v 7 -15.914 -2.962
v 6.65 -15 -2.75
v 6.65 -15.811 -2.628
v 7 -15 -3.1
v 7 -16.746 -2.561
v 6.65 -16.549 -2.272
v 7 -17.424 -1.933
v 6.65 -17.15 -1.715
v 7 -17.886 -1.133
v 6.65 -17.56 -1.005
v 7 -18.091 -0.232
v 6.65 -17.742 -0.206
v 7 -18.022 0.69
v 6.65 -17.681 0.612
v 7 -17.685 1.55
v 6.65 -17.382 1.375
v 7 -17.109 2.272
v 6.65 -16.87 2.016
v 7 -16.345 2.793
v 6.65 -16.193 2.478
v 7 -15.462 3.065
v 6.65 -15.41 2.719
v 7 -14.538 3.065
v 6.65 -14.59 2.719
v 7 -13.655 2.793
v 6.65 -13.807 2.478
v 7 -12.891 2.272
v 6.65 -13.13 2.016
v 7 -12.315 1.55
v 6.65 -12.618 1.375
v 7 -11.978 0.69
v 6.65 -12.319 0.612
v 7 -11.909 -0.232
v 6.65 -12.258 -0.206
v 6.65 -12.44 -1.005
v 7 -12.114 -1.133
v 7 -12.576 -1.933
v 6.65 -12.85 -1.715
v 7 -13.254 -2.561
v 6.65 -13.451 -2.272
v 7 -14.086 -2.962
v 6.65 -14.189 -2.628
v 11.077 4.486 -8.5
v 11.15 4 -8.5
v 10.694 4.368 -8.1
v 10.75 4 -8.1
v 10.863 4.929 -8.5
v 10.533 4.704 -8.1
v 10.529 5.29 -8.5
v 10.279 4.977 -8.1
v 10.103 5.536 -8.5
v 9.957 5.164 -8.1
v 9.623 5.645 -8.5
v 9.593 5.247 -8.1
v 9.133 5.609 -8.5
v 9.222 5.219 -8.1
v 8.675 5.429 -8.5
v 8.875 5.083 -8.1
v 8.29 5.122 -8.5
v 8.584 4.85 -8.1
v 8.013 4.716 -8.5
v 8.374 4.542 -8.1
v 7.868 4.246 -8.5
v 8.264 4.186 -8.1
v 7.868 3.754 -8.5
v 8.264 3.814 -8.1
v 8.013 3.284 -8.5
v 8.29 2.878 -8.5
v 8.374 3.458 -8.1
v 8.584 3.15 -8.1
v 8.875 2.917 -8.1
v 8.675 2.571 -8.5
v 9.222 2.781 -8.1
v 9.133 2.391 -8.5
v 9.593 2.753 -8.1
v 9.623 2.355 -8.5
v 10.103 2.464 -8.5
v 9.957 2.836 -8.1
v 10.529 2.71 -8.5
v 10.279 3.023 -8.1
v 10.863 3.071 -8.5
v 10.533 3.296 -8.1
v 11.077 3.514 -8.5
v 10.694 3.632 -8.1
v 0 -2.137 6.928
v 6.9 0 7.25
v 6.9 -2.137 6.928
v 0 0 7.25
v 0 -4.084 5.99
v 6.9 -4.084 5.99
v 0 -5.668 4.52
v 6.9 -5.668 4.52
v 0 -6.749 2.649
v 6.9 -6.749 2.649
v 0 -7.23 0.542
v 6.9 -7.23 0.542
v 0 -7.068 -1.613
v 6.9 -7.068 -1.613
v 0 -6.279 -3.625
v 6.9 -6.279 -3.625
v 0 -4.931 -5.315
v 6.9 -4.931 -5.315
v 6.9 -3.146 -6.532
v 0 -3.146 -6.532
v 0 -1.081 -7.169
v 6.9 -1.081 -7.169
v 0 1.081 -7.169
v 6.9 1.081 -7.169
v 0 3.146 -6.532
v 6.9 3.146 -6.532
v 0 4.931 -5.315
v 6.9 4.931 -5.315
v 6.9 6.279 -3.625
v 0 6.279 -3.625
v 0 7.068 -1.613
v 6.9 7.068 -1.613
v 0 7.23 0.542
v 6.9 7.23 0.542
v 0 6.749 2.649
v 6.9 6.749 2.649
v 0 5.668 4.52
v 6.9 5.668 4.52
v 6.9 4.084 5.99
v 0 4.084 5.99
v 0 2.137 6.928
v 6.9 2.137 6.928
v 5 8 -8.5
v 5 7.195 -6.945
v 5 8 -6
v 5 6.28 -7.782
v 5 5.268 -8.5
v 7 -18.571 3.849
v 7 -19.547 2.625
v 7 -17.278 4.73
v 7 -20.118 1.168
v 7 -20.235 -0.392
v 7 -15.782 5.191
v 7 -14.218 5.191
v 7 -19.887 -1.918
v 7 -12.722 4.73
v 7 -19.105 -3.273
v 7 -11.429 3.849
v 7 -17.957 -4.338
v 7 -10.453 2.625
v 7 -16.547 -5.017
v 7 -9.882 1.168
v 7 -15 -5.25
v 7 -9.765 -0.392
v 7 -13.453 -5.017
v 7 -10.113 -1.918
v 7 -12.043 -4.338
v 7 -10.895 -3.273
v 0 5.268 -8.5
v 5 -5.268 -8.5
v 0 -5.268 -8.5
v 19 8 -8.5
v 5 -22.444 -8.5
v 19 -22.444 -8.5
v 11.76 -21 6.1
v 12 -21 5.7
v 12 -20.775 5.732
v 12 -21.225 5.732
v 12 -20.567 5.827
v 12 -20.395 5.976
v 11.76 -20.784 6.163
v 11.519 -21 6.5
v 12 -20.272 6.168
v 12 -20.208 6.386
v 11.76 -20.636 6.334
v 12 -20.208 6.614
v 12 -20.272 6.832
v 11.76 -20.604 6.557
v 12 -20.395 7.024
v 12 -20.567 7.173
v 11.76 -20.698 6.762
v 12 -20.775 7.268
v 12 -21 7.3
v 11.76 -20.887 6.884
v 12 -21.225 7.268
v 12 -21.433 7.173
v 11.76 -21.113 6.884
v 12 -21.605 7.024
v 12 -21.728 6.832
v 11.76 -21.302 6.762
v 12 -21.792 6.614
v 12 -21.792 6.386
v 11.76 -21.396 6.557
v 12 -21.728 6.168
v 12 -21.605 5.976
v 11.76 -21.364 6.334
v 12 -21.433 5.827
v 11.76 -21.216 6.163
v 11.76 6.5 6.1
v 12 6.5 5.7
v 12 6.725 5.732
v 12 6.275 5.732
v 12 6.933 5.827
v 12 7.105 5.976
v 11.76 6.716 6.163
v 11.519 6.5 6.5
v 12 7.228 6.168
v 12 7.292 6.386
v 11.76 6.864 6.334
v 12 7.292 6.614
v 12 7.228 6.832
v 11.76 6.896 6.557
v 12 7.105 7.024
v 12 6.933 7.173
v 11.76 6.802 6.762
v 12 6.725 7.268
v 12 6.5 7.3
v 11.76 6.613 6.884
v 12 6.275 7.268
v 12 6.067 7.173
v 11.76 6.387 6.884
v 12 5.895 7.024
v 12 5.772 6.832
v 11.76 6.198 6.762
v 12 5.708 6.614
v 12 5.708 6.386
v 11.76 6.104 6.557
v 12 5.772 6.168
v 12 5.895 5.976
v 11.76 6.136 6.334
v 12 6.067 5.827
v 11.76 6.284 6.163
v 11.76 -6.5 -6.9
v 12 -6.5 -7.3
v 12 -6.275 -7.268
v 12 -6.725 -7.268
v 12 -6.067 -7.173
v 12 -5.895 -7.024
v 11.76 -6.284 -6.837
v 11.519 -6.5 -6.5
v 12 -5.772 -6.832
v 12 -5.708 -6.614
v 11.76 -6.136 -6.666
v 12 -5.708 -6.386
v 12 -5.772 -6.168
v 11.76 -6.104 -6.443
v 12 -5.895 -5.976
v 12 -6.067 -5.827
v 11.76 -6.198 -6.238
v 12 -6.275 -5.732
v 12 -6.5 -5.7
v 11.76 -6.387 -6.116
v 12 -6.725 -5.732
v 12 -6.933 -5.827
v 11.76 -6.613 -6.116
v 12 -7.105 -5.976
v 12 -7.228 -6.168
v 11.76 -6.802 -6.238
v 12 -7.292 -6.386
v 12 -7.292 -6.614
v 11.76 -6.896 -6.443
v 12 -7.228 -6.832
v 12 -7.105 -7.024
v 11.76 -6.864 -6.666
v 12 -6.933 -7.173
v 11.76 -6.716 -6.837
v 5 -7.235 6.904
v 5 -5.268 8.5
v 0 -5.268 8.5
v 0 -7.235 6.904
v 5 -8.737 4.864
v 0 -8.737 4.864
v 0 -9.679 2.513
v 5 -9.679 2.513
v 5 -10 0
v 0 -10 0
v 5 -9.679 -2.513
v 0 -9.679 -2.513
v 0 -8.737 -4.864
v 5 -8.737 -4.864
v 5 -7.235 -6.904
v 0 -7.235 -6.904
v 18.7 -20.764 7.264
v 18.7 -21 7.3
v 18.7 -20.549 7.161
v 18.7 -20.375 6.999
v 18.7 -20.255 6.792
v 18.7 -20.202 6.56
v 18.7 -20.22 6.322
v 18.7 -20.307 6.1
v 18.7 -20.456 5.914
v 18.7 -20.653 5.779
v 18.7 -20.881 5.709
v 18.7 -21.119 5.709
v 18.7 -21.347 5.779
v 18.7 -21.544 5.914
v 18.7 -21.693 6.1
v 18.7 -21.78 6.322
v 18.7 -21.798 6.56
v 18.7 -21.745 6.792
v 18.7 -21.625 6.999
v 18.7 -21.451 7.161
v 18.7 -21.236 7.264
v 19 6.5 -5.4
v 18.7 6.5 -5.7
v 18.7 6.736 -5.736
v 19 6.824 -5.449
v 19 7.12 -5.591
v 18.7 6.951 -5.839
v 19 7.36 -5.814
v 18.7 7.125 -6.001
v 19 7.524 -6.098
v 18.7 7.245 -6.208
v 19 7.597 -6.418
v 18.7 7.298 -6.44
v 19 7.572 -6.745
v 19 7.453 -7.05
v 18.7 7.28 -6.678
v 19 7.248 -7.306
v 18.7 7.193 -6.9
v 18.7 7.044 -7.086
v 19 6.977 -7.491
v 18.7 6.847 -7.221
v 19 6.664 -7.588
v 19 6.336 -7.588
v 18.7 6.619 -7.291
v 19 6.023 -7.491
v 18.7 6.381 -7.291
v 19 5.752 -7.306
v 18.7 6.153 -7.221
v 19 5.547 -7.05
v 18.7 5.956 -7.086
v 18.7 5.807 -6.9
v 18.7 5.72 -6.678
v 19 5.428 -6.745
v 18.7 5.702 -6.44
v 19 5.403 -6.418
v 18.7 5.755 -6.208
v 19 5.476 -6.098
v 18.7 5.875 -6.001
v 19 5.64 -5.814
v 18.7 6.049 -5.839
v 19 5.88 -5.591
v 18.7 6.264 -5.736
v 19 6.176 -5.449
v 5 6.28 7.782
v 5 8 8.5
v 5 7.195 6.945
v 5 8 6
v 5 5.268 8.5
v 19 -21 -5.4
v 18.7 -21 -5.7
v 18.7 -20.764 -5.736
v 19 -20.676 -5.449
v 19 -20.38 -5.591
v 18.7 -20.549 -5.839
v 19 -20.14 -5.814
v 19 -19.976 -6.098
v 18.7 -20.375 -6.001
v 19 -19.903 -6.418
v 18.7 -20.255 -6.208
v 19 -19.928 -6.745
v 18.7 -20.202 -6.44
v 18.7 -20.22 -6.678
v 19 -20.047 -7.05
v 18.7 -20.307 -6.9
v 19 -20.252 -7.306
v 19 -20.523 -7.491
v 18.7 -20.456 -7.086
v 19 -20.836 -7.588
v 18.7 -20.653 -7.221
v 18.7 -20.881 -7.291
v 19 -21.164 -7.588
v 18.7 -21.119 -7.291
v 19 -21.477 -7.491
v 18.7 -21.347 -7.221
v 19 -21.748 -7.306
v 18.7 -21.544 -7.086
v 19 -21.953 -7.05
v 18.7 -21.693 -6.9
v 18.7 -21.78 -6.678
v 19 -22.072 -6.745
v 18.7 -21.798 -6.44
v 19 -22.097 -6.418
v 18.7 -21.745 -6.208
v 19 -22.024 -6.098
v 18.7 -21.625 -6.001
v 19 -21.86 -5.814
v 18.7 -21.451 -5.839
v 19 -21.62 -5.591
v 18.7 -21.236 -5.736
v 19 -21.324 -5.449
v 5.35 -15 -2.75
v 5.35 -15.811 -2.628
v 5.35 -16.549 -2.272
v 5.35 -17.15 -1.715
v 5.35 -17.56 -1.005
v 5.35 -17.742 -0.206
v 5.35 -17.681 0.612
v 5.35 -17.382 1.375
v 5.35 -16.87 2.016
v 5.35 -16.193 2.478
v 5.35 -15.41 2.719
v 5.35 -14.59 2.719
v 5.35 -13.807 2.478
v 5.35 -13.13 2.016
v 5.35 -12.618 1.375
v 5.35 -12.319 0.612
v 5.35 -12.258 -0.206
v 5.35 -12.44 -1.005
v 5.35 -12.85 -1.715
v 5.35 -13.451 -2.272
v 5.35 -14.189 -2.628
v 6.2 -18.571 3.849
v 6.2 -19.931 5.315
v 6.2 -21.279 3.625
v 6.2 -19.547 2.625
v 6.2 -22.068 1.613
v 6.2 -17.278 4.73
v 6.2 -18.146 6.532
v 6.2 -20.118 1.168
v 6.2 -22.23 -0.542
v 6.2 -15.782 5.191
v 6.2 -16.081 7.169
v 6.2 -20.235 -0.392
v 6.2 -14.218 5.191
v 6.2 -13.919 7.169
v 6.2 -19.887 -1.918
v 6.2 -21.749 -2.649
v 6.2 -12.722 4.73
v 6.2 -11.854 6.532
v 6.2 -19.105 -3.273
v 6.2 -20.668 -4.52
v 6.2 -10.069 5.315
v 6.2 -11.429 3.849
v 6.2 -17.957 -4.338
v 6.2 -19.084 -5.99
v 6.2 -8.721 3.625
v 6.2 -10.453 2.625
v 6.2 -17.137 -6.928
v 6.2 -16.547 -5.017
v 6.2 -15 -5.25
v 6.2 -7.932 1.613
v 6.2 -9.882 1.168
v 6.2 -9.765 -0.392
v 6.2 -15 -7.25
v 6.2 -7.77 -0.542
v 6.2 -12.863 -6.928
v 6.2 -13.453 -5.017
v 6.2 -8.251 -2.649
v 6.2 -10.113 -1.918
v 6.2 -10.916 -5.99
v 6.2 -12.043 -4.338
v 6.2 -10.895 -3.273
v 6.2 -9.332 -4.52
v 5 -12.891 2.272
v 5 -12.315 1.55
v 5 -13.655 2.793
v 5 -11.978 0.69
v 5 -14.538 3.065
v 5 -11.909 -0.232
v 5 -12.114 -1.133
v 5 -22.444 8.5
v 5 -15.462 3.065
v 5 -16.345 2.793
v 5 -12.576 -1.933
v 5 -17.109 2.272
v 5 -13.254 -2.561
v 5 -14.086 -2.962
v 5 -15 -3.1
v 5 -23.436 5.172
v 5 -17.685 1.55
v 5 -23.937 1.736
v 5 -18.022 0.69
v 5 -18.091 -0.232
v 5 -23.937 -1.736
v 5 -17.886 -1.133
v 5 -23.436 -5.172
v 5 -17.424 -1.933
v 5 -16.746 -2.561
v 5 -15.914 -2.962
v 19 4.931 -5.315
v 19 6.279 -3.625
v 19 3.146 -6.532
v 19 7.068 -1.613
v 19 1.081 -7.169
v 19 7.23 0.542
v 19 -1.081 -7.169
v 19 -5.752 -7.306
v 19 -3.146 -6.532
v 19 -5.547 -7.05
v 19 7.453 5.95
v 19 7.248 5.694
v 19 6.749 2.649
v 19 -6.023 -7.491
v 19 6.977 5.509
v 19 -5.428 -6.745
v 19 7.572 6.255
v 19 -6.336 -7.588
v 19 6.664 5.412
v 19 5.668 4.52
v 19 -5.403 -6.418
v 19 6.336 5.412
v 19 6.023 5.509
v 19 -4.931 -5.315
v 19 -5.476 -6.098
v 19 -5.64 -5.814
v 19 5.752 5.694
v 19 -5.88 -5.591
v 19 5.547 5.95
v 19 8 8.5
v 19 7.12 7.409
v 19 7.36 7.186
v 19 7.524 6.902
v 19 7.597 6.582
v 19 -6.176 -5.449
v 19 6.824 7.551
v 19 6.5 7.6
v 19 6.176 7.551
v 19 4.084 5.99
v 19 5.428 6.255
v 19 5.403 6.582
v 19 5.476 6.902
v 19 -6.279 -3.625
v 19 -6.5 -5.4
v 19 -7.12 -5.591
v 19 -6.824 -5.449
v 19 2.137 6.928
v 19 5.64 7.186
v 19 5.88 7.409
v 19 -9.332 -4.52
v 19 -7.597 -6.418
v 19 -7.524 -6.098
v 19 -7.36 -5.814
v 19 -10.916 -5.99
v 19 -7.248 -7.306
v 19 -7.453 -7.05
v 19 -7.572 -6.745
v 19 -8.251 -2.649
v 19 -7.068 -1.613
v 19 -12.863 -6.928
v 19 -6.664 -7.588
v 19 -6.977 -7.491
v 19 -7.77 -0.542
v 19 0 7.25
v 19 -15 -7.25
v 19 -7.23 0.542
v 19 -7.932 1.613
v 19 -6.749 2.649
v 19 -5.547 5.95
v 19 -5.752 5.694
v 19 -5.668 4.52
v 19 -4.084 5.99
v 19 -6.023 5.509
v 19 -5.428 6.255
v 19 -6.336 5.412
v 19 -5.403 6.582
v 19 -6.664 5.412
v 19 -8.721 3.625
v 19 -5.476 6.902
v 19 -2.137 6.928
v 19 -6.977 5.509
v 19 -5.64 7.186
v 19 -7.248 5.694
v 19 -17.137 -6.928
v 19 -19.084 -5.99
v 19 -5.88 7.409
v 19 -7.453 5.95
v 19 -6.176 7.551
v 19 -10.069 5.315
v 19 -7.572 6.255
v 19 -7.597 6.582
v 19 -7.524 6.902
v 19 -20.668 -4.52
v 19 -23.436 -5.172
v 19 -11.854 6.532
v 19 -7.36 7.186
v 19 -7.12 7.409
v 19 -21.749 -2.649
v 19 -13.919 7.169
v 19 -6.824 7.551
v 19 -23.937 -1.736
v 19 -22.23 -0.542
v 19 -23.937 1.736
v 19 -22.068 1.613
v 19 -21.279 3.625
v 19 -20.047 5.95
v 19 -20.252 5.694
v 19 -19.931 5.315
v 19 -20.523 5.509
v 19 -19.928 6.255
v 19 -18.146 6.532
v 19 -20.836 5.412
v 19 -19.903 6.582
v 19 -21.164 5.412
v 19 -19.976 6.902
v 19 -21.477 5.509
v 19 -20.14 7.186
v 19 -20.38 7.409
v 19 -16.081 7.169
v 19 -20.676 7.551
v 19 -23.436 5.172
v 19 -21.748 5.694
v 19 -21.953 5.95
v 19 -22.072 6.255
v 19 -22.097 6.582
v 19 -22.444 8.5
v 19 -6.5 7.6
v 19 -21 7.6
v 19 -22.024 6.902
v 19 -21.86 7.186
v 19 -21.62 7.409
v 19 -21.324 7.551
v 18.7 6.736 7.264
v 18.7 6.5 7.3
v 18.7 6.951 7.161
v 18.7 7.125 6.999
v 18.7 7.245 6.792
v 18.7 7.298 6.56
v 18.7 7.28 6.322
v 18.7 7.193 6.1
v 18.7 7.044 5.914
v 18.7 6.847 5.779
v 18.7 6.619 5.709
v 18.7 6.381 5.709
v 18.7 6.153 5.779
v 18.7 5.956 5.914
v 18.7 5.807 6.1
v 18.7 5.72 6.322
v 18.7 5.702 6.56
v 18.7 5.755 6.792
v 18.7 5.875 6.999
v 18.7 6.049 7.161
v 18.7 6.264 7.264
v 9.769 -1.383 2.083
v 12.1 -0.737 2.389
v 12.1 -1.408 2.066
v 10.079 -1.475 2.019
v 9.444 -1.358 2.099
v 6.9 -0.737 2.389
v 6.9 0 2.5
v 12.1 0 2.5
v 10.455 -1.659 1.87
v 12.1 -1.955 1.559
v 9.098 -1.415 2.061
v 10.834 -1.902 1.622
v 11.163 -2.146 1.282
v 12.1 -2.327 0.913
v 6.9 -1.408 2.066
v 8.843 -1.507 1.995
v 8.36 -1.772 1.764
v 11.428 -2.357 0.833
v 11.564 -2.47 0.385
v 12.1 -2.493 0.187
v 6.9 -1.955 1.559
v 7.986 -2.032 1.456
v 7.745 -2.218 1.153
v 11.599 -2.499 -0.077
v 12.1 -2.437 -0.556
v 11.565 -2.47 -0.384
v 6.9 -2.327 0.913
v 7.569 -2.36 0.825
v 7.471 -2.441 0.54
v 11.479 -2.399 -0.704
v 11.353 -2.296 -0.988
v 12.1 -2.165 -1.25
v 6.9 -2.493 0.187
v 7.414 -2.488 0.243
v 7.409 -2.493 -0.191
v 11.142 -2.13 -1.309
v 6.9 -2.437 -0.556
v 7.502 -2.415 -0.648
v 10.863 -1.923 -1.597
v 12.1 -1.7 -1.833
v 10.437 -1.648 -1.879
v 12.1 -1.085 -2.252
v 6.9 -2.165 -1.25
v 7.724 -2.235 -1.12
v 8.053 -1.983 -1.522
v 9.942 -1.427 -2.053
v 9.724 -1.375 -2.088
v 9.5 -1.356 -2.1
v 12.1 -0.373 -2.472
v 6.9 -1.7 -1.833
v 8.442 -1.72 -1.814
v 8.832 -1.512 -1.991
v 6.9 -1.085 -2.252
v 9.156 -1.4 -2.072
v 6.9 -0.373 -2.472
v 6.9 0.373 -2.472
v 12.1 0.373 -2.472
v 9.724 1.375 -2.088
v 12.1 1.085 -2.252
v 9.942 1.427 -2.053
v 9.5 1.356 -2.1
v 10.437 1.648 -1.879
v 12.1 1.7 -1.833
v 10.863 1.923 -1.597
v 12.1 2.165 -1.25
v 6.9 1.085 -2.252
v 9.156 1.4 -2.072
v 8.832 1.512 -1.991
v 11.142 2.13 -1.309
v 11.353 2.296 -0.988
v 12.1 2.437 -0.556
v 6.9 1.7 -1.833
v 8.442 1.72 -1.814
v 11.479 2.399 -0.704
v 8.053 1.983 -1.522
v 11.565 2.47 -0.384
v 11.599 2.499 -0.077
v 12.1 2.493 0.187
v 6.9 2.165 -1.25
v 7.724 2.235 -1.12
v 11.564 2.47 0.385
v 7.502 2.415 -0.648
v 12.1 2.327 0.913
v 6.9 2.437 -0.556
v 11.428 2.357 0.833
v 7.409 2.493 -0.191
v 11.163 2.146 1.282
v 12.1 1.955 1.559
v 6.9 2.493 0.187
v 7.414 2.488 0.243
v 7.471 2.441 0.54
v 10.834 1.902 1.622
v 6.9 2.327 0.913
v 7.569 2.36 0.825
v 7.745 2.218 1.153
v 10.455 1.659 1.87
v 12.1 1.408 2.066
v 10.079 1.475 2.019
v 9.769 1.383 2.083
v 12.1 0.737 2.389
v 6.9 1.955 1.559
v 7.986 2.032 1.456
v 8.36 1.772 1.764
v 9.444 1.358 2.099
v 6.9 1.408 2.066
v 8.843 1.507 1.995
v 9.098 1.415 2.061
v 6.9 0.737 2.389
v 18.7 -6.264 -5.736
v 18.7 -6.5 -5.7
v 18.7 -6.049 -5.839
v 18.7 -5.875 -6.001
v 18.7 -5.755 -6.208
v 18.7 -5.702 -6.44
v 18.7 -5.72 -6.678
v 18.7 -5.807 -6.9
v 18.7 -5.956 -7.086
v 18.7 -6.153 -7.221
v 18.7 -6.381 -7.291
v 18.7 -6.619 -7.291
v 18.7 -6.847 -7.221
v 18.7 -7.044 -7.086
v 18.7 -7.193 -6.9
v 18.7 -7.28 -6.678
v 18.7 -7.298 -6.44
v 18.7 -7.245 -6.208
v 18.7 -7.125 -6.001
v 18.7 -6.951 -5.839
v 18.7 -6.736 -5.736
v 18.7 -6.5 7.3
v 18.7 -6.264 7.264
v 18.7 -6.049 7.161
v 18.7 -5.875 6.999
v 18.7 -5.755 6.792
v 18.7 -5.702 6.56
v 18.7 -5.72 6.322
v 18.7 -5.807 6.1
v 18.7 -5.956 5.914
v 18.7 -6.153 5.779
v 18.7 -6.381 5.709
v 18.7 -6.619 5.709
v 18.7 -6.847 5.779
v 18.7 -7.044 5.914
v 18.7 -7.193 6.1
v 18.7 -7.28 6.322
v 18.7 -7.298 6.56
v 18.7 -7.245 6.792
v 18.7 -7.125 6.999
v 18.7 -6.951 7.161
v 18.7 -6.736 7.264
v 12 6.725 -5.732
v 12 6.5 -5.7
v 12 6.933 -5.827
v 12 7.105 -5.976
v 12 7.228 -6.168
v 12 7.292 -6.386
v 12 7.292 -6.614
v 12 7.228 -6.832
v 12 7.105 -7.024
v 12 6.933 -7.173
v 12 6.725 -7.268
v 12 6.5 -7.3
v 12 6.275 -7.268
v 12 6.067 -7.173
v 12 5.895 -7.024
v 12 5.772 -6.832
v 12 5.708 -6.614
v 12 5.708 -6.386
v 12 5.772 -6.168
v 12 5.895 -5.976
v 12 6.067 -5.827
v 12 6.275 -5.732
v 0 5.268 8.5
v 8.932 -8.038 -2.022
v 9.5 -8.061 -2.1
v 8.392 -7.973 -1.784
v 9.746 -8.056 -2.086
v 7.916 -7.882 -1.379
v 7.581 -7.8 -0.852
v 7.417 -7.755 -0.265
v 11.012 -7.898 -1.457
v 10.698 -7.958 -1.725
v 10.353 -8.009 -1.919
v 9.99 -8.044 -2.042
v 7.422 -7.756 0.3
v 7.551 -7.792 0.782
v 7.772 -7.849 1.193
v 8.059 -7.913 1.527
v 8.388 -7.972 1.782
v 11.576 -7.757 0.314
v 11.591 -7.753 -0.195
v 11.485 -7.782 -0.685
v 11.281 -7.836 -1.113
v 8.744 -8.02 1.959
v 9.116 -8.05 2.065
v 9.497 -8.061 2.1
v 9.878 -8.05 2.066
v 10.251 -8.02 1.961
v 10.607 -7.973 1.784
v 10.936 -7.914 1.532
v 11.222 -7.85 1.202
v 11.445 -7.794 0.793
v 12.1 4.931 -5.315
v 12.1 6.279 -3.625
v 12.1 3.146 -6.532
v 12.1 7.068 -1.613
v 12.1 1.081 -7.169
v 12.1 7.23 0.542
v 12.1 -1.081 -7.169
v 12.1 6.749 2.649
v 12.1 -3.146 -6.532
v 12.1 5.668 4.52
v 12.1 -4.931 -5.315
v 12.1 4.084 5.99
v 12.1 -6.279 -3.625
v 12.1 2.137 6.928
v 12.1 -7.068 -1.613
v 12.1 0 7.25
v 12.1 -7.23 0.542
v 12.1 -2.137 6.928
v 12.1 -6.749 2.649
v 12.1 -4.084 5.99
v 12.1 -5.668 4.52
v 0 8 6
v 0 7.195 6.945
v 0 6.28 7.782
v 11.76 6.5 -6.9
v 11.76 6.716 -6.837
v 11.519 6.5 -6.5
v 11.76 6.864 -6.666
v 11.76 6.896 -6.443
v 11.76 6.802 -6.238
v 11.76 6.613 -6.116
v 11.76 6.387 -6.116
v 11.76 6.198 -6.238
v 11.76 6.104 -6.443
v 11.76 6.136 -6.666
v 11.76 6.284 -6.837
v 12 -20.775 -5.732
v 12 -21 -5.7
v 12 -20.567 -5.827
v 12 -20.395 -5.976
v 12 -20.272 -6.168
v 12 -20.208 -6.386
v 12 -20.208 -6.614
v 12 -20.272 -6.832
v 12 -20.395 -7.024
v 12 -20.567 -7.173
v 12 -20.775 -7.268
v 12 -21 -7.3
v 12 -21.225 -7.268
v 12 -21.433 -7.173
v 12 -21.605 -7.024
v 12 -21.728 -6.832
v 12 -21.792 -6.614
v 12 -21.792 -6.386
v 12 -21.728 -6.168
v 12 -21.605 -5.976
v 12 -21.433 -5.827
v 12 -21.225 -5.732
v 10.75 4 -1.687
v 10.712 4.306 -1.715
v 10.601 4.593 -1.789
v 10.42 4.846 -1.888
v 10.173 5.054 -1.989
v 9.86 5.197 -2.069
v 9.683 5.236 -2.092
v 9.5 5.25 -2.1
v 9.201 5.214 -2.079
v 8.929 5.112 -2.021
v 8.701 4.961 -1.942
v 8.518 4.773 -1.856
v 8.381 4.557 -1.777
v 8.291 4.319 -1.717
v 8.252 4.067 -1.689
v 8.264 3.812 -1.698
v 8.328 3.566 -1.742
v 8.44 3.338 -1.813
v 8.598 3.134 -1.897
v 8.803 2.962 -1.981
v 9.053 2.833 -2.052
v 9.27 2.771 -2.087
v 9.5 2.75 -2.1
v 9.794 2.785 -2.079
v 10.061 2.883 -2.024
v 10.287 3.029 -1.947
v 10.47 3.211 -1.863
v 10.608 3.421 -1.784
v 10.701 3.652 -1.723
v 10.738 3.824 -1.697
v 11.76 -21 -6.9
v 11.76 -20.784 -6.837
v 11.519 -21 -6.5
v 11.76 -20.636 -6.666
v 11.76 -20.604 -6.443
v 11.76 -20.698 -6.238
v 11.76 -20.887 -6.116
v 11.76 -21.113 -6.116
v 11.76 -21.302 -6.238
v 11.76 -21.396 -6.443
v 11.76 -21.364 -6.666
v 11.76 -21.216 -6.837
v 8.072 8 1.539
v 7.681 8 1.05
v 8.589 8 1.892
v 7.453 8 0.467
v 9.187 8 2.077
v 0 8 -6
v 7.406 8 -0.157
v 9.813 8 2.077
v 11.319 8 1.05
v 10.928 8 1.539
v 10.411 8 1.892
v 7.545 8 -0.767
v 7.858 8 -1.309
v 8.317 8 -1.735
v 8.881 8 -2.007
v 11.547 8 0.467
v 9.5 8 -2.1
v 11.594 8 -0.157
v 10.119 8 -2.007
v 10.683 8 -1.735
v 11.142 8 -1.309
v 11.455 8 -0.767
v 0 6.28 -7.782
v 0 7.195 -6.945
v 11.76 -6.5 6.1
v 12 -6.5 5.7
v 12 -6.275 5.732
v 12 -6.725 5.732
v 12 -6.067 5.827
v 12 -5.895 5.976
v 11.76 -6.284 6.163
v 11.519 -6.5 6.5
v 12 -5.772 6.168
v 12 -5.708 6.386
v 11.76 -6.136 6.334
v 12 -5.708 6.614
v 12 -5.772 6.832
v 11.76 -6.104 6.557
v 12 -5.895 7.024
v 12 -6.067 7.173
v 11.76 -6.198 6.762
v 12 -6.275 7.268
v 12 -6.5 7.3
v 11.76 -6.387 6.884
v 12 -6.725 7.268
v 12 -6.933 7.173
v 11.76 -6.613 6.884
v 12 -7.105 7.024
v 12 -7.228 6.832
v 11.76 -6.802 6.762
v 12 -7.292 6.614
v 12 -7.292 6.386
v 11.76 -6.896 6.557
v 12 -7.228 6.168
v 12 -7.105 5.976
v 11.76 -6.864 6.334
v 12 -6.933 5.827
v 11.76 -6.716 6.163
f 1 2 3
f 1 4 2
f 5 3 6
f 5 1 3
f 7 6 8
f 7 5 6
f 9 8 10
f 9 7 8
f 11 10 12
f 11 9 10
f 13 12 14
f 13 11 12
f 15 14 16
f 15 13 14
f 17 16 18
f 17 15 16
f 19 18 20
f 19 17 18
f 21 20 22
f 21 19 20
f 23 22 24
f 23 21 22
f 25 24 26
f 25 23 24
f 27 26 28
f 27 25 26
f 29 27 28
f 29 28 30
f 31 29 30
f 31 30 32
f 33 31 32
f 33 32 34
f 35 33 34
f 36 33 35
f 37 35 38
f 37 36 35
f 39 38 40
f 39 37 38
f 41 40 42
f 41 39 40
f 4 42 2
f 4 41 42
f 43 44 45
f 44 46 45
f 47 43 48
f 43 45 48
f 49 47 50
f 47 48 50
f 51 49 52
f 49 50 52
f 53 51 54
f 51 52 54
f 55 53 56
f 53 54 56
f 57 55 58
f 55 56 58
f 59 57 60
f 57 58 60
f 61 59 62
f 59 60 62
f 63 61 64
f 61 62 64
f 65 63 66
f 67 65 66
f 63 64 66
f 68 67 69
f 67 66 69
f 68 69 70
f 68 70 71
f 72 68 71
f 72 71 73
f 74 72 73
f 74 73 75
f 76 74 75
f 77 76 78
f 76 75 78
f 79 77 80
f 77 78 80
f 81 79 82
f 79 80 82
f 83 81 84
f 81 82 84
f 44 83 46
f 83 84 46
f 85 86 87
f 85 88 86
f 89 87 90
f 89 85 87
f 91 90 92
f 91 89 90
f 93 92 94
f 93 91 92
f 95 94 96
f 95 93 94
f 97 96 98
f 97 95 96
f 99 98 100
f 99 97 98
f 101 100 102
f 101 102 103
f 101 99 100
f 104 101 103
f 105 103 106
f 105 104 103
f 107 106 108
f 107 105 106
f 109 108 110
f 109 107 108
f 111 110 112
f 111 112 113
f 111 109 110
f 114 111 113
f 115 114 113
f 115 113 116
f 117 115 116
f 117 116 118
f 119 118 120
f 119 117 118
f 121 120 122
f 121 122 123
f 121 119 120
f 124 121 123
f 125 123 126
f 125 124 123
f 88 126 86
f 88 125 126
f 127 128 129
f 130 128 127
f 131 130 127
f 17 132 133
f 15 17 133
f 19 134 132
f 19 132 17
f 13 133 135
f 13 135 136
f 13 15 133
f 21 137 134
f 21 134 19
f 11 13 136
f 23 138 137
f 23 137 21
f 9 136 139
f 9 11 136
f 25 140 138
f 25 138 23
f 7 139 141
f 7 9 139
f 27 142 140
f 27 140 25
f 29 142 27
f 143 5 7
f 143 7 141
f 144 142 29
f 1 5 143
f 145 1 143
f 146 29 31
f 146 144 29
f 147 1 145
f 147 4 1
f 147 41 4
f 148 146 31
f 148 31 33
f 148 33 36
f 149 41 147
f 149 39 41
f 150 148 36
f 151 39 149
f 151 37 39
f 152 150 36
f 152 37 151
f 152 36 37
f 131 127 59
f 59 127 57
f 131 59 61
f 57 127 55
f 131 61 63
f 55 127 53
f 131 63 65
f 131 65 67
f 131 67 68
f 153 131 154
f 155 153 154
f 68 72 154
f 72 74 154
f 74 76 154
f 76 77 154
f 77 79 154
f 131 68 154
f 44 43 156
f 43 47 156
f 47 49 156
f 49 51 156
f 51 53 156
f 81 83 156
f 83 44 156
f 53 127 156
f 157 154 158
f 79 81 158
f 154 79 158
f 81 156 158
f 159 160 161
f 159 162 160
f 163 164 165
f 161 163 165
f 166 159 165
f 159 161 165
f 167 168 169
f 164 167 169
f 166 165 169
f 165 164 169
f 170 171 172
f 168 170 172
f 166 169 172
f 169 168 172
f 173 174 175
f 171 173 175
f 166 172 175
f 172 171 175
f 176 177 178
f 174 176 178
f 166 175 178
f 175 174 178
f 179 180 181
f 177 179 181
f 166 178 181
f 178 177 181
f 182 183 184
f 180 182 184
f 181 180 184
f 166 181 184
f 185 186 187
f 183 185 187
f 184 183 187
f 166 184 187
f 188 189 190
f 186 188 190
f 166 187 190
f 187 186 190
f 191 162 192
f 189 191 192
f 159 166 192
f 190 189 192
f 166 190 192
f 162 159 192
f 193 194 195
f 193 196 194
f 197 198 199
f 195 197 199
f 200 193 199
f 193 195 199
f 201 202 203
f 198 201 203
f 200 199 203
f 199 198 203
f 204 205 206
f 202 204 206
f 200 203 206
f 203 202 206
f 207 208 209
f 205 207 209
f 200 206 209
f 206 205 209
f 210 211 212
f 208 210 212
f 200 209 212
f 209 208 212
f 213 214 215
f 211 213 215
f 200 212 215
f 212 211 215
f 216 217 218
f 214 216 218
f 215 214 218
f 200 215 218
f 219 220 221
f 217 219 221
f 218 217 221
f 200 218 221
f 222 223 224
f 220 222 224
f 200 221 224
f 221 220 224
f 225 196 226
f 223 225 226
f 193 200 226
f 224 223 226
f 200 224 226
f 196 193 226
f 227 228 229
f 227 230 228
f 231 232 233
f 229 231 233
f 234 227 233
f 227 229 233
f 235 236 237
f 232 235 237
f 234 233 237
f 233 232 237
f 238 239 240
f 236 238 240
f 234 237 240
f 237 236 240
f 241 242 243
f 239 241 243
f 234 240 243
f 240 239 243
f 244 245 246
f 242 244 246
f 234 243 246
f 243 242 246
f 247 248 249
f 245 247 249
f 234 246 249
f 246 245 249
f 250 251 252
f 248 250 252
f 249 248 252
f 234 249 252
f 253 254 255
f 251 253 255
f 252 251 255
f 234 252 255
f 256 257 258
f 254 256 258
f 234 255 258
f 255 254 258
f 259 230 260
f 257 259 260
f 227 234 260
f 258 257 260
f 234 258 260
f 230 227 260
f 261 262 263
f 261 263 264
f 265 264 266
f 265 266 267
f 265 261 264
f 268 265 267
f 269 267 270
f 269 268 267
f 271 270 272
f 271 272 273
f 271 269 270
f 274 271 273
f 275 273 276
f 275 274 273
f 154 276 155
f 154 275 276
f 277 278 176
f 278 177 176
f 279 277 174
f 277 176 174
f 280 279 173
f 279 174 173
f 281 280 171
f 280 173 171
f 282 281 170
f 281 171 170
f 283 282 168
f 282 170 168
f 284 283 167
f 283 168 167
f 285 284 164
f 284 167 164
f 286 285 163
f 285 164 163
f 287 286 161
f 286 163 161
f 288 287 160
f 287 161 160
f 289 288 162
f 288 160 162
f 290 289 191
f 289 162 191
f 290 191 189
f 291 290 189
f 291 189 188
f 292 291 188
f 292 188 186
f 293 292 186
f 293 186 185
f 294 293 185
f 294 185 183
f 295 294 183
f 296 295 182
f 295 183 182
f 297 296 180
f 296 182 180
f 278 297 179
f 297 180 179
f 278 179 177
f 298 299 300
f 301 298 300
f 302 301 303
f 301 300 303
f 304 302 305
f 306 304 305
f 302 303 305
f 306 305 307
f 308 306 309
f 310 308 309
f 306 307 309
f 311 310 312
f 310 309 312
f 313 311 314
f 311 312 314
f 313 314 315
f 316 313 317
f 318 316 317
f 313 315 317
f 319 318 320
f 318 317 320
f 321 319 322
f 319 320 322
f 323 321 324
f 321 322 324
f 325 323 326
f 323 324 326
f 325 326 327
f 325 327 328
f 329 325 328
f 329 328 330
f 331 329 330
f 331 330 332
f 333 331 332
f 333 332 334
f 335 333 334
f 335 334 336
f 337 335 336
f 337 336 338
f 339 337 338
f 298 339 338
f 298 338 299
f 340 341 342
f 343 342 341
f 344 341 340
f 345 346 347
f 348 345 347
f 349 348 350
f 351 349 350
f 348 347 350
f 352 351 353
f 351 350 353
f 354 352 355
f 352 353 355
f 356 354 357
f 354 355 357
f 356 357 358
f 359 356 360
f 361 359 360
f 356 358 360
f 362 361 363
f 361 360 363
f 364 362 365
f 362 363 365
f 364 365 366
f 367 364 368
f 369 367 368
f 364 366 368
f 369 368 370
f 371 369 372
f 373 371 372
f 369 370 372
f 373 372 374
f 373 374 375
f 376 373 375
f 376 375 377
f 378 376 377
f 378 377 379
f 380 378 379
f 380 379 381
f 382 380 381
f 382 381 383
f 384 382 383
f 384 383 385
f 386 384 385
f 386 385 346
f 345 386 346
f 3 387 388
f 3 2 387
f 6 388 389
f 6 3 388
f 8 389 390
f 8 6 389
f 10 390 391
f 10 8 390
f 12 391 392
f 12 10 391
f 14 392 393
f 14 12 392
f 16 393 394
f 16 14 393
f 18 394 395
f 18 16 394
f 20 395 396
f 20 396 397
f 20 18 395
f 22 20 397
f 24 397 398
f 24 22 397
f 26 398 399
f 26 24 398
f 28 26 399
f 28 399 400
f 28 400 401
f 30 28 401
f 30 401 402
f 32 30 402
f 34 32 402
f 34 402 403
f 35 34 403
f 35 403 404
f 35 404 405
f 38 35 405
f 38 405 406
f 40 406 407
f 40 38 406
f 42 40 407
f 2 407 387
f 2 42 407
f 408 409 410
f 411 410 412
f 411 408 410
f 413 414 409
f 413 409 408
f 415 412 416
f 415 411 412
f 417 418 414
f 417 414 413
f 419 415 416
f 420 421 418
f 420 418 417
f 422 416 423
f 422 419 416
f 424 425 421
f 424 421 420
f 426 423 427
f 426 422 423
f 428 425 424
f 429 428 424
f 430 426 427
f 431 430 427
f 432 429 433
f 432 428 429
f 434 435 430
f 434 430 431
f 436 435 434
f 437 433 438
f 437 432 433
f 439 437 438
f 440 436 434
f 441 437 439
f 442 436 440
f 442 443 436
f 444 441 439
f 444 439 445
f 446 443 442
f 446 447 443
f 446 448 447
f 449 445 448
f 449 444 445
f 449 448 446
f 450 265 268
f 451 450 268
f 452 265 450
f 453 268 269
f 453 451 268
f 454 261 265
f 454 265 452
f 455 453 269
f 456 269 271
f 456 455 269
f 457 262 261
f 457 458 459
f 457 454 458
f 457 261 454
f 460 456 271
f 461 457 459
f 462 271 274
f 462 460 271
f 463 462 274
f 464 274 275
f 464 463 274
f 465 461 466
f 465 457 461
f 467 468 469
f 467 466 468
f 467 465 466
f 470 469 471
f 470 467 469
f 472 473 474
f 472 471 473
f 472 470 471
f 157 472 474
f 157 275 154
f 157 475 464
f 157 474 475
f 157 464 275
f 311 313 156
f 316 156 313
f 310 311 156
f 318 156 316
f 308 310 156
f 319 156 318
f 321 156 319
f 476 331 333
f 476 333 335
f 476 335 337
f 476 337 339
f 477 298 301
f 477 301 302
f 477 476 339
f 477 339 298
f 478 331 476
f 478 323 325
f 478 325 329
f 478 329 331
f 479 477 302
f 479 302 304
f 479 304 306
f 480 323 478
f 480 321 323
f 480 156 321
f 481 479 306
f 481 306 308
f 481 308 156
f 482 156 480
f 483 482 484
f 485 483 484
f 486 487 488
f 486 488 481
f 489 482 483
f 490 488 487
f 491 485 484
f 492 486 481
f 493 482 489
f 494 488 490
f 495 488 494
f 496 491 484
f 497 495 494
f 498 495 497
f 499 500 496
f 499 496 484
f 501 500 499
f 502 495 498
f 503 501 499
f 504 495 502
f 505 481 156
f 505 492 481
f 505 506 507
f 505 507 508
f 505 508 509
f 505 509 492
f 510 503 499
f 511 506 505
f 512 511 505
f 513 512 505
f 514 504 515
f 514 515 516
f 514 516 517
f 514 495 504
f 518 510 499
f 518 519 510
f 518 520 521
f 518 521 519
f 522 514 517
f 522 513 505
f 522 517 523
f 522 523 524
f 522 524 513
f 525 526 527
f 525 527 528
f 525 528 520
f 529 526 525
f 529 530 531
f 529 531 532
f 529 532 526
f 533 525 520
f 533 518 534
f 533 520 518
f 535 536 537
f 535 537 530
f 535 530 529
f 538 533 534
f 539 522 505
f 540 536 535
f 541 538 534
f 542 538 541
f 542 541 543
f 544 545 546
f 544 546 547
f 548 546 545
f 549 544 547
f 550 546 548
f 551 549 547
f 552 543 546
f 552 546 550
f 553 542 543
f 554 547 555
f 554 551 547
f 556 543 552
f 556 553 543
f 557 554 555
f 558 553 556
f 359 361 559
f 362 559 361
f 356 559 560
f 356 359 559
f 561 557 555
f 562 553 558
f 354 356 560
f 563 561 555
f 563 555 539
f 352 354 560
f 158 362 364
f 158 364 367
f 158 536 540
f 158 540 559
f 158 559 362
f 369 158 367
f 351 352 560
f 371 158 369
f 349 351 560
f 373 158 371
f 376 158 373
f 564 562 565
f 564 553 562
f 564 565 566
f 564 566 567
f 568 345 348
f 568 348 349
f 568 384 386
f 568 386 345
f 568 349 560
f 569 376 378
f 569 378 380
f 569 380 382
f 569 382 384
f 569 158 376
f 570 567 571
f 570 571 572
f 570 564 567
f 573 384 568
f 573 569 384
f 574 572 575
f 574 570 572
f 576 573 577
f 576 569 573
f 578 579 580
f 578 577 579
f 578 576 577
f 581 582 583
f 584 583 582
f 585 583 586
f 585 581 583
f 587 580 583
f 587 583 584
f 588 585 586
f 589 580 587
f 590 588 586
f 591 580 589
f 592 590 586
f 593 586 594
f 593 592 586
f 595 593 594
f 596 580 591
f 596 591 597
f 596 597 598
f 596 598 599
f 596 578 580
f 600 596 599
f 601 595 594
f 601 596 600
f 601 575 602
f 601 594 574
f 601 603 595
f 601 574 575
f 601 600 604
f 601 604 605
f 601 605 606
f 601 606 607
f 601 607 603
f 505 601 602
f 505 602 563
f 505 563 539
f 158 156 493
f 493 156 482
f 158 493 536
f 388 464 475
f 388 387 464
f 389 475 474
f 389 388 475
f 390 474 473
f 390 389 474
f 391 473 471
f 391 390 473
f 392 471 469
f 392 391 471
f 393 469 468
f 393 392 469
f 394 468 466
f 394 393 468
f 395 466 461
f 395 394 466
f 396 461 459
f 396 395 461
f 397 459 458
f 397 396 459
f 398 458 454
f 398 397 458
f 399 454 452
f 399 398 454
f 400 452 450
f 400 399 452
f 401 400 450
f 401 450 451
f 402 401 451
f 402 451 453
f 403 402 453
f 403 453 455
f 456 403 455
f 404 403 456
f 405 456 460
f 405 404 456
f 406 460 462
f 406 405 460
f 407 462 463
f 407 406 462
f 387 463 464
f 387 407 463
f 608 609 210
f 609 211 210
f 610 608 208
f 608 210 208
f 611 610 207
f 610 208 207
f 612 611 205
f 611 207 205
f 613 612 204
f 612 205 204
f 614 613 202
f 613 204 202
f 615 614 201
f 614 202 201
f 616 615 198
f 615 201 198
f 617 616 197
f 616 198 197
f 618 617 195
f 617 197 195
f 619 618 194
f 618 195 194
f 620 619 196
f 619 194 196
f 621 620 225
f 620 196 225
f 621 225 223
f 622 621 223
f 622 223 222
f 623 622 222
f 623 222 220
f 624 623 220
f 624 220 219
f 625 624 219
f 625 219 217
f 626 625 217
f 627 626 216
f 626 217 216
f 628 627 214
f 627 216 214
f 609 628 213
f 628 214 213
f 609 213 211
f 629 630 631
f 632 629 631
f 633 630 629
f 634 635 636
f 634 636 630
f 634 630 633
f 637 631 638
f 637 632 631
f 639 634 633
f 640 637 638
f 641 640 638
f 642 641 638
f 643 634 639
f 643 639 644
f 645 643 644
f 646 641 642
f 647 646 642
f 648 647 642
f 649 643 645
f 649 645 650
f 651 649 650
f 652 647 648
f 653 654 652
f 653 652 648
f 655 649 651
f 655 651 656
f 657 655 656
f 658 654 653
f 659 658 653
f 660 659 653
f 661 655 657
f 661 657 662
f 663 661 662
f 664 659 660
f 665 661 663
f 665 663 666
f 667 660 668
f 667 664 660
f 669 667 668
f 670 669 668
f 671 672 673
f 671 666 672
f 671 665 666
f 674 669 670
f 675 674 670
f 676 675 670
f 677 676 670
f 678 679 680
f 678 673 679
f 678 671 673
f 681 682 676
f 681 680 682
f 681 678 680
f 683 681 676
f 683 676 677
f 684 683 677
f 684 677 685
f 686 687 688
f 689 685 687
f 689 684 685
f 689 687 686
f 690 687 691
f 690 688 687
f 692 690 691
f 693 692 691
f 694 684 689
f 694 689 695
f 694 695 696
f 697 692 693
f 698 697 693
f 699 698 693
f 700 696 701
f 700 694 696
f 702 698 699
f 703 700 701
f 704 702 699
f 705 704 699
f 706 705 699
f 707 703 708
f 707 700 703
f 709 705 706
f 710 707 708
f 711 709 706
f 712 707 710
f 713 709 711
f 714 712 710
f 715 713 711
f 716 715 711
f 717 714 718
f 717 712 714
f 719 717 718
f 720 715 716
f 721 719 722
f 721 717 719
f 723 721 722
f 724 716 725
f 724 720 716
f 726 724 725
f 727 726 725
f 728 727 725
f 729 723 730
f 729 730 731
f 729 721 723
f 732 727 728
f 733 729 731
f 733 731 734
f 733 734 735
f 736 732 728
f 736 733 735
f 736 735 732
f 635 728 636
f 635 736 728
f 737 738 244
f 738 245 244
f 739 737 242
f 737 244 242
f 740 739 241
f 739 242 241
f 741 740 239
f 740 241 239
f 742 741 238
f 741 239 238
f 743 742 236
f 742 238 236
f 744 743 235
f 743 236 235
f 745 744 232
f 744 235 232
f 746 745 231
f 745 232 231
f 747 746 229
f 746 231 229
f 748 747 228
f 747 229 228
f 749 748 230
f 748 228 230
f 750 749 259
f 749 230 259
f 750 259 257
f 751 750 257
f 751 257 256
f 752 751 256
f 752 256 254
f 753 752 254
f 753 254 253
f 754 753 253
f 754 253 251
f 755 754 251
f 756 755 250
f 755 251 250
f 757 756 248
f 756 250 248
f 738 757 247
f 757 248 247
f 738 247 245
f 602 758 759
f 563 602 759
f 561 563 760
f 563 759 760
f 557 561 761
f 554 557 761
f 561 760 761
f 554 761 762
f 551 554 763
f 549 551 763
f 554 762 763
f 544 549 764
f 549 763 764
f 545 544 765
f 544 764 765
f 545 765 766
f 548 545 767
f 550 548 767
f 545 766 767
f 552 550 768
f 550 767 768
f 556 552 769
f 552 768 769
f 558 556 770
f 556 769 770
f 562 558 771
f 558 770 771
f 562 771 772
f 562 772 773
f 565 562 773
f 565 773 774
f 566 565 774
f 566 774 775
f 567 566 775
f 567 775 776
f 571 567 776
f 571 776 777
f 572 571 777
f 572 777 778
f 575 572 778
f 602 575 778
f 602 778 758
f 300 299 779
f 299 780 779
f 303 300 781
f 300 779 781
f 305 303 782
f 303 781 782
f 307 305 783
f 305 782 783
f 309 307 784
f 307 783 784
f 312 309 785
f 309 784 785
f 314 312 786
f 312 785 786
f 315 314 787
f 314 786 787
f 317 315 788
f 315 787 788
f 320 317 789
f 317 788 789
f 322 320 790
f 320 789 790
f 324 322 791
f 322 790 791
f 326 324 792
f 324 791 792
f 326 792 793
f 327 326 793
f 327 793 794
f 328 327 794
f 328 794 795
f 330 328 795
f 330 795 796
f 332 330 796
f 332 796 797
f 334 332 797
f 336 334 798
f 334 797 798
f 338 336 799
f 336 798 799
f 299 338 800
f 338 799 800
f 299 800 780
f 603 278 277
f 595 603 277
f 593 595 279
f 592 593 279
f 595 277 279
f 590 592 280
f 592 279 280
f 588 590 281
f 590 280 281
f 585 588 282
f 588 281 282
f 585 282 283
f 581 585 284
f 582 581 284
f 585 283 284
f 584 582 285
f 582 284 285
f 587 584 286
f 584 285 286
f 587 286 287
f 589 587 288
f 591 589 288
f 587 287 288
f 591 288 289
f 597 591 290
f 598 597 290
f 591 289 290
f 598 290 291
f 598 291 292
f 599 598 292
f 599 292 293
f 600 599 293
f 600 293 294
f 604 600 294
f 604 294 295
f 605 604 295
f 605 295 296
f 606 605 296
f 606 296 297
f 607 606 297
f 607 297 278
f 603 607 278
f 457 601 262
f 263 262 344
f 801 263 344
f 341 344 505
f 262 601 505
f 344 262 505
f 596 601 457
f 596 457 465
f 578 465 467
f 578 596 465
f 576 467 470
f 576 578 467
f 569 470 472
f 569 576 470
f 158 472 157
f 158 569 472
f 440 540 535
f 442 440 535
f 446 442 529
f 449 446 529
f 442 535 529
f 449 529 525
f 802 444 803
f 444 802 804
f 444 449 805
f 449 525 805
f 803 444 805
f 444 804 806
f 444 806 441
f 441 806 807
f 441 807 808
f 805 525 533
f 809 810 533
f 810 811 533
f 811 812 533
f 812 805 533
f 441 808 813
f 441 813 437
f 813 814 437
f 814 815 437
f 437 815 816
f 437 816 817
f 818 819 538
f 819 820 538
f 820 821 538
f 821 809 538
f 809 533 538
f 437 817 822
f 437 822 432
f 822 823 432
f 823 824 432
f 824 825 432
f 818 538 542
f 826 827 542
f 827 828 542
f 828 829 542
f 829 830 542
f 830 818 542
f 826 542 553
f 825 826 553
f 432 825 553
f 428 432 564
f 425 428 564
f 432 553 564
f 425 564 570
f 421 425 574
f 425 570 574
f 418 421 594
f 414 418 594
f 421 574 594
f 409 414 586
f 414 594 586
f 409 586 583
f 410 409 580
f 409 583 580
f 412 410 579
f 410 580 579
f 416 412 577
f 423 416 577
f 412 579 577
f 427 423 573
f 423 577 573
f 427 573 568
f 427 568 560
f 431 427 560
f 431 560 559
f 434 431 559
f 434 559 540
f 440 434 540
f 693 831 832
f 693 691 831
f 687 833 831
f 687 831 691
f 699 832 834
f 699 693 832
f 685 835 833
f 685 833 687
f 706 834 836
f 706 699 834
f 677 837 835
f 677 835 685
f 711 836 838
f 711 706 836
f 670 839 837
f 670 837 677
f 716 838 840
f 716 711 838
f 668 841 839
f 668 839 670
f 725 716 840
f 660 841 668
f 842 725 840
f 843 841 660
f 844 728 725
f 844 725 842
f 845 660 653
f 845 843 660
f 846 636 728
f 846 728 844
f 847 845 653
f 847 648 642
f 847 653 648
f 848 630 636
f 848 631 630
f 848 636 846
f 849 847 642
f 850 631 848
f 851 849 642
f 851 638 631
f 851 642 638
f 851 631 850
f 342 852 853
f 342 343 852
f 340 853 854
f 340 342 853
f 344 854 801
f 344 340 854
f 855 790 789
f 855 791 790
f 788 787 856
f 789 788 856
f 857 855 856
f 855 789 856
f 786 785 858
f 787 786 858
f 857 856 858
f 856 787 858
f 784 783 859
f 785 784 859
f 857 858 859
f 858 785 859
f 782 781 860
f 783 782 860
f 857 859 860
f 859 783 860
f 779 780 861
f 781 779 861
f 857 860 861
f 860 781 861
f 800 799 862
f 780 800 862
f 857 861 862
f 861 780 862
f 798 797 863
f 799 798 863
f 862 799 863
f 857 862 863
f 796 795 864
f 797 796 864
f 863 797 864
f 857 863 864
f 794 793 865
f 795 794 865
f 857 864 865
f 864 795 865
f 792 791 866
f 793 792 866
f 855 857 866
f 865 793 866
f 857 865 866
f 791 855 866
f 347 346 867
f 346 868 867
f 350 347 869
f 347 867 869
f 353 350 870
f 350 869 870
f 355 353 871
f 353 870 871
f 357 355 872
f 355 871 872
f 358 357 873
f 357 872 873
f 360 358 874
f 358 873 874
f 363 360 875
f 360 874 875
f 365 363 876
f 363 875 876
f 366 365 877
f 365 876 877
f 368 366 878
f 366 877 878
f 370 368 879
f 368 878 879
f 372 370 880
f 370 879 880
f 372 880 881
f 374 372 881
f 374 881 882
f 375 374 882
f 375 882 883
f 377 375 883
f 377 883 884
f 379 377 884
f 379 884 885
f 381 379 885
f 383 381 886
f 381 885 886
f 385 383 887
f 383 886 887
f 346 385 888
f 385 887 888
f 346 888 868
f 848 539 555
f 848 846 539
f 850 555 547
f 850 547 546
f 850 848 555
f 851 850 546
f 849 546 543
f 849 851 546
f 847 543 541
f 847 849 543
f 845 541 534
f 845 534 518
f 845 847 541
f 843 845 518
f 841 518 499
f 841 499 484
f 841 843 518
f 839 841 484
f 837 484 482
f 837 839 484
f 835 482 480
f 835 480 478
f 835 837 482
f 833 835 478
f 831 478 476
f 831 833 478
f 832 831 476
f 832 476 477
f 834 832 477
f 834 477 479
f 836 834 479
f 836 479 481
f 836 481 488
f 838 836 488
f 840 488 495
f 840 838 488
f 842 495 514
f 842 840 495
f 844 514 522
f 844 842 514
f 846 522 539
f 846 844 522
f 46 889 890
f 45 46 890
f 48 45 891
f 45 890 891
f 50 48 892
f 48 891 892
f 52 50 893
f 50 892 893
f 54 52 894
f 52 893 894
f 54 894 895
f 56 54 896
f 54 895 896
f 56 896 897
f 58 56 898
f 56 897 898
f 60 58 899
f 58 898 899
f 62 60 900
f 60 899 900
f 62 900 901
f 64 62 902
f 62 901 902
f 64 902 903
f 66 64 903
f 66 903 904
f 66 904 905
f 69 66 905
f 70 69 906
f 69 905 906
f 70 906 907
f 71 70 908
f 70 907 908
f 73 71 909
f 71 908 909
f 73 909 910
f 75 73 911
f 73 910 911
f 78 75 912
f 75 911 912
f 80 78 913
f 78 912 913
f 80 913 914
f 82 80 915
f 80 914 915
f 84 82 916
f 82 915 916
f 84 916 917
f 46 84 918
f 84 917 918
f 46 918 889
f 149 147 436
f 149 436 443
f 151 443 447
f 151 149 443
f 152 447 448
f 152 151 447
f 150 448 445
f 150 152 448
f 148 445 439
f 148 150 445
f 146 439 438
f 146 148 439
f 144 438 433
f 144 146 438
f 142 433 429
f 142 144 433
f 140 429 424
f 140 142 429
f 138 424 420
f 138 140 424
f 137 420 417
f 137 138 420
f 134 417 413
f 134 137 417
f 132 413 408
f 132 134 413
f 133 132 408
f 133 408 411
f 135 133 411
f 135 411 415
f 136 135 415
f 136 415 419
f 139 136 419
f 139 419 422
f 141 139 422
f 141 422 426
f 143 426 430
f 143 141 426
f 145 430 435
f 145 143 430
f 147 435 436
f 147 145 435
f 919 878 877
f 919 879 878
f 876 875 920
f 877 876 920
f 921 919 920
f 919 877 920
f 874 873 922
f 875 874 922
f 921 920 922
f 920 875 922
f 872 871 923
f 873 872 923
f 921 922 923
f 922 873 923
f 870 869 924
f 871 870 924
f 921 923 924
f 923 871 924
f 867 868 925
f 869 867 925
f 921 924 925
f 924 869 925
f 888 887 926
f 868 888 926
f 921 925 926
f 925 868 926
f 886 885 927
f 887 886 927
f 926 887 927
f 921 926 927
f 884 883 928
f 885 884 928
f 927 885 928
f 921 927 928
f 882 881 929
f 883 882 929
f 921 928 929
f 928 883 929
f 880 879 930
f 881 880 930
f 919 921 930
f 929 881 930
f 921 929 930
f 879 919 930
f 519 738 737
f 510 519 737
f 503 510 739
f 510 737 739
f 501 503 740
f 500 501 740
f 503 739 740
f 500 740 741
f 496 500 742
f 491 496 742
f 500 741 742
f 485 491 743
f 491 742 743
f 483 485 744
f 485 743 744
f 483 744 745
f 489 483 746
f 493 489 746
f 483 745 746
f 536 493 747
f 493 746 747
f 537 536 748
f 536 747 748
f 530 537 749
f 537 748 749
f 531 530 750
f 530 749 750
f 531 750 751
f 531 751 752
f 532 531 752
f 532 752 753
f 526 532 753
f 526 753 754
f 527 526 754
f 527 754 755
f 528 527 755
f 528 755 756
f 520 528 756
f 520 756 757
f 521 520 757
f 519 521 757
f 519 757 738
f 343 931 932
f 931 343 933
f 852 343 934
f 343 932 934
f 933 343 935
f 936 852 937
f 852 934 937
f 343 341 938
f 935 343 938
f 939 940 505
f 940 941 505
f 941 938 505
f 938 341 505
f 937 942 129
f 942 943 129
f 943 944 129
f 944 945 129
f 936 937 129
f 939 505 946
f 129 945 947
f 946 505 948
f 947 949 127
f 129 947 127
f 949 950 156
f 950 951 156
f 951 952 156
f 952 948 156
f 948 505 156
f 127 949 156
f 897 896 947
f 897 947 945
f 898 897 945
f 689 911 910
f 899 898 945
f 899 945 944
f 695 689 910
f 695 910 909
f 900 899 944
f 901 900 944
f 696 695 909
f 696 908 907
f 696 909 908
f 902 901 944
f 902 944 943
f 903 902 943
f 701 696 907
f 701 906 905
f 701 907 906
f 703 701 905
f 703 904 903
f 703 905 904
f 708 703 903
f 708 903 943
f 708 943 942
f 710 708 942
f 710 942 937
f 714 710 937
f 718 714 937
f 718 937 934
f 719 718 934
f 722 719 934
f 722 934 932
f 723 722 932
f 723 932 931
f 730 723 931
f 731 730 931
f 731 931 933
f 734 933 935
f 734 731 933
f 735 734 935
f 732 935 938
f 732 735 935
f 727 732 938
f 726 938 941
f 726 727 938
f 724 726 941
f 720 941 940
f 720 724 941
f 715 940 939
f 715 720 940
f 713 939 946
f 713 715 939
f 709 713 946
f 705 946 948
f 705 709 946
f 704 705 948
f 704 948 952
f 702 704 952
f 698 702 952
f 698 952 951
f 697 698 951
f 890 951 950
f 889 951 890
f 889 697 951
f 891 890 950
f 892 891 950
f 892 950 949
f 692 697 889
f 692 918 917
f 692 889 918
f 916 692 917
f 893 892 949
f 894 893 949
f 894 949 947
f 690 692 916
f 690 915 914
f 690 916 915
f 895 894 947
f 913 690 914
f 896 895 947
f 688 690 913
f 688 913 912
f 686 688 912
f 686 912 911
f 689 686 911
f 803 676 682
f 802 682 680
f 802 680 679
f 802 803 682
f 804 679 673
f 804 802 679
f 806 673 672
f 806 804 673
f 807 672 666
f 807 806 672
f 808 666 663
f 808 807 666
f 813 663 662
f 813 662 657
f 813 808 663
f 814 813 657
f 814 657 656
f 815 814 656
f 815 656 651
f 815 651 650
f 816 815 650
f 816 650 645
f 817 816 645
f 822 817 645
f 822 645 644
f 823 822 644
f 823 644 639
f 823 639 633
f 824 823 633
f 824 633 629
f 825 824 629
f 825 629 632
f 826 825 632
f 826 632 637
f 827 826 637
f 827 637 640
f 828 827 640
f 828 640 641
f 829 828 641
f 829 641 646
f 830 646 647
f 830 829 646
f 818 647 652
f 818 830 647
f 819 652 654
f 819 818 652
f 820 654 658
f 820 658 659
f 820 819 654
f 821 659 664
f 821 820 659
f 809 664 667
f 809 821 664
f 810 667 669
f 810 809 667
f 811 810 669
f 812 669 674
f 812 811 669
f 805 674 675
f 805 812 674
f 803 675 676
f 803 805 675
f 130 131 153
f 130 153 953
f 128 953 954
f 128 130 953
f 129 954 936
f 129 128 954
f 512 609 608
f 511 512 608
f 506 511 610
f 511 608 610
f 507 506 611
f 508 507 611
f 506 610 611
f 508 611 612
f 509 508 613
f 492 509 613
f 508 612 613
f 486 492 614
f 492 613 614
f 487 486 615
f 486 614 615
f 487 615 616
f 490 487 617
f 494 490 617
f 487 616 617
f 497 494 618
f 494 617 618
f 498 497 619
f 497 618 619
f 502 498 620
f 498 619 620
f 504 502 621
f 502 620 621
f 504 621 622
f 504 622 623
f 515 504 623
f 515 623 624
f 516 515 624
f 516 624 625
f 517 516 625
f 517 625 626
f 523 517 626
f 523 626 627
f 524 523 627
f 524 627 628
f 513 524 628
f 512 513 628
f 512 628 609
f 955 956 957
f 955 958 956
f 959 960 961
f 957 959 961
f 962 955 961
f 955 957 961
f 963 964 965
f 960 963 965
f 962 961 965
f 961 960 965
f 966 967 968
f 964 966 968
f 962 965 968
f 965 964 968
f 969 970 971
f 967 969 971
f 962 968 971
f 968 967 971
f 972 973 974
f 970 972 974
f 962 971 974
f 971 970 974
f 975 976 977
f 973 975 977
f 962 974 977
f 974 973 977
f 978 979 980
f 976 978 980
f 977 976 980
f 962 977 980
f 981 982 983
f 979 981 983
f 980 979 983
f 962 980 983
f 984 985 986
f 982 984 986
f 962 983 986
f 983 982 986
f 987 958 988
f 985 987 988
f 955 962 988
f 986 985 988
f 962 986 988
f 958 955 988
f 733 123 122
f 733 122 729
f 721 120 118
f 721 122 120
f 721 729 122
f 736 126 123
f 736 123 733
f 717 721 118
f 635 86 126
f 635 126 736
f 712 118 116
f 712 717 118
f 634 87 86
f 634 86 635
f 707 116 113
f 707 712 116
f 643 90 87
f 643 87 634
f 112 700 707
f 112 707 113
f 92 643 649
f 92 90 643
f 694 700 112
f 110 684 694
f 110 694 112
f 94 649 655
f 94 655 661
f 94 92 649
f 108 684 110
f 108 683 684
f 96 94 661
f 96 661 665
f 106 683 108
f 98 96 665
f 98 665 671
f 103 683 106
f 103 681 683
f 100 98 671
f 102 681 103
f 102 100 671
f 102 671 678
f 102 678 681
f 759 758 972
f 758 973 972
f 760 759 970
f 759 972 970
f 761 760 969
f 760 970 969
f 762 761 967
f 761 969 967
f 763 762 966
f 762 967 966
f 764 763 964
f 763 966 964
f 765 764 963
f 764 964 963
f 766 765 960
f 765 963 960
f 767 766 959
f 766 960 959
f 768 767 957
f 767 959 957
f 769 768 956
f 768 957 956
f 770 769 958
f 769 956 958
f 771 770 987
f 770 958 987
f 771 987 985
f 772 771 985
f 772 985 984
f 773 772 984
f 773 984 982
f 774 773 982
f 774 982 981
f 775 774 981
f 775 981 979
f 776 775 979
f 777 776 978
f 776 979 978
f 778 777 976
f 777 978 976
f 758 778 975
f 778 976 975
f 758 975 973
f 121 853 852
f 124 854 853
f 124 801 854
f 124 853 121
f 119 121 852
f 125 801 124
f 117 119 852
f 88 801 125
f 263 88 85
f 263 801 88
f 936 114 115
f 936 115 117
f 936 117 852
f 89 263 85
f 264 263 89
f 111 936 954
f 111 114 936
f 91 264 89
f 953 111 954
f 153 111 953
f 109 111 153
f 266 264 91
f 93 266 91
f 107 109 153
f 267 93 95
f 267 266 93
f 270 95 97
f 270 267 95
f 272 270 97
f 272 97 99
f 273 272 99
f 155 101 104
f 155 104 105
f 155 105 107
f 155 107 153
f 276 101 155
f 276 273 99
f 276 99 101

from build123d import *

# Parameters (mm, degrees)
SKETCH_3_R               = 7.25
CUT_EXTRUDE_1_DEPTH      = 12
CUT_EXTRUDE_3_DEPTH      = 39.897300678
CUT_EXTRUDE_2_DEPTH      = 16
CUT_EXTRUDE_2_DEPTH_BACK = 10
SKETCH_4_R               = 2.1
M2X0_41_D                = 1.6
M2X0_41_DEPTH            = 7
M2X0_41_CSINK_D          = 2.2
M2X0_41_CSINK_ANGLE      = 90
M2X0_41_TIP              = 0.480688495
SKETCH_12_R              = 7.25
SKETCH_12_R_2            = 5.25
CUT_EXTRUDE_4_DEPTH      = 0.8


# Read off the part's stored shape, not the designer's step: Отверстие обработанное метчиком M3x0.51
with BuildPart() as part:
    # Эскиз2 → Повернуть1 (revolve)
    with BuildSketch(Plane.XY, mode=Mode.PRIVATE) as revolve_1_sk:
        Polygon((0, 10), (5, 10), (5, 24), (19, 24), (19, 7.25), (12.1, 7.25), (12.1, 2.5), (6.9, 2.5), (6.9, 7.25), (0, 7.25), align=None)
    revolve(revolve_1_sk.sketch.rotate(Axis((0, 0, 0), (1, 0, 0)), 90), axis=Axis((0, 0, 0), (1, 0, 0)))

    # Эскиз3 → Вырез-Вытянуть1 (cut)
    with BuildSketch(Plane(origin=(19, 0, 0), x_dir=(0, 0, -1), z_dir=(1, 0, 0))):
        with Locations((0, -15)):
            Circle(SKETCH_3_R)
    extrude(amount=-CUT_EXTRUDE_1_DEPTH, mode=Mode.SUBTRACT)

    # Эскиз5 → Вырез-Вытянуть3 (cut, through all)
    with BuildSketch(Plane(origin=(19, 0, 0), x_dir=(0, 0, -1), z_dir=(1, 0, 0))):
        with BuildLine():
            ThreePointArc((24, 0), (-13.638181697, 19.748417658), (-8.5, -22.444375687))
            Line((-8.5, -22.444375687), (-8.5, 8))
            Line((-8.5, 8), (8.5, 8))
            Line((8.5, 8), (8.5, -22.444375687))
            ThreePointArc((8.5, -22.444375687), (19.748417658, -13.638181697), (24, 0))
        make_face()
    extrude(amount=-CUT_EXTRUDE_3_DEPTH, mode=Mode.SUBTRACT)

    # Эскиз4 → Вырез-Вытянуть2 (cut, two sides: drawn at the far end of the back side and taken through both)
    with BuildSketch(Plane(origin=(0, 0, 0), x_dir=(1, 0, 0), z_dir=(0, 1, 0)).offset(-CUT_EXTRUDE_2_DEPTH_BACK)):
        with Locations(Location((9.5, 0, 0), (0, 0, 90))):
            Circle(SKETCH_4_R)
    extrude(amount=CUT_EXTRUDE_2_DEPTH + CUT_EXTRUDE_2_DEPTH_BACK, mode=Mode.SUBTRACT)

    # Отверстие обработанное метчиком M3x0.51 outline → Отверстие обработанное метчиком M3x0.51 (revolve, cut)
    with BuildSketch(Plane(origin=(9.5, 4, 0), x_dir=(1, 0, 0), z_dir=(0, -1, 0))):
        Polygon((1.25, -8.1), (1.25, -1.687245944), (0, -1.687245944), (0, -8.5), (1.65, -8.5), align=None)
    revolve(axis=Axis((9.5, 4, 0), (0, 0, 1)), mode=Mode.SUBTRACT)

    # Отверстие обработанное метчиком M2x0.41
    with Locations(Plane(origin=(19, 0, 0), x_dir=(0, 0, -1), z_dir=(1, 0, 0))):
        with Locations((-6.5, 6.5), (6.5, 6.5), (6.5, -6.5), (-6.5, -6.5), (-6.5, -21), (6.5, -21)):
            CounterSinkHole(M2X0_41_D / 2, M2X0_41_CSINK_D / 2, depth=M2X0_41_DEPTH, counter_sink_angle=M2X0_41_CSINK_ANGLE)
            with Locations((0, 0, -(M2X0_41_DEPTH + M2X0_41_TIP / 2))):  # 118° drill point
                Cone(0, M2X0_41_D / 2, M2X0_41_TIP, mode=Mode.SUBTRACT)

    # Эскиз12 → Вырез-Вытянуть4 (cut)
    with BuildSketch(Plane(origin=(7, 0, 0), x_dir=(0, 0, -1), z_dir=(1, 0, 0))):
        with Locations((0, -15)):
            Circle(SKETCH_12_R)
        with Locations((0, -15)):
            Circle(SKETCH_12_R_2, mode=Mode.SUBTRACT)
    extrude(amount=-CUT_EXTRUDE_4_DEPTH, mode=Mode.SUBTRACT)

    # Эскиз13 → Отверстие обработанное метчиком M6x0.51 (revolve, cut)
    with BuildSketch(Plane(origin=(7, -15, 0), x_dir=(0, 0, -1), z_dir=(0, 1, 0))):
        Polygon((0, 0), (0, 2), (3.1, 2), (2.75, 1.65), (2.75, 0.35), (3.1, 0), align=None)
    revolve(axis=Axis((13.35, -15, 0), (-1, 0, 0)), mode=Mode.SUBTRACT)


solid = part.part
